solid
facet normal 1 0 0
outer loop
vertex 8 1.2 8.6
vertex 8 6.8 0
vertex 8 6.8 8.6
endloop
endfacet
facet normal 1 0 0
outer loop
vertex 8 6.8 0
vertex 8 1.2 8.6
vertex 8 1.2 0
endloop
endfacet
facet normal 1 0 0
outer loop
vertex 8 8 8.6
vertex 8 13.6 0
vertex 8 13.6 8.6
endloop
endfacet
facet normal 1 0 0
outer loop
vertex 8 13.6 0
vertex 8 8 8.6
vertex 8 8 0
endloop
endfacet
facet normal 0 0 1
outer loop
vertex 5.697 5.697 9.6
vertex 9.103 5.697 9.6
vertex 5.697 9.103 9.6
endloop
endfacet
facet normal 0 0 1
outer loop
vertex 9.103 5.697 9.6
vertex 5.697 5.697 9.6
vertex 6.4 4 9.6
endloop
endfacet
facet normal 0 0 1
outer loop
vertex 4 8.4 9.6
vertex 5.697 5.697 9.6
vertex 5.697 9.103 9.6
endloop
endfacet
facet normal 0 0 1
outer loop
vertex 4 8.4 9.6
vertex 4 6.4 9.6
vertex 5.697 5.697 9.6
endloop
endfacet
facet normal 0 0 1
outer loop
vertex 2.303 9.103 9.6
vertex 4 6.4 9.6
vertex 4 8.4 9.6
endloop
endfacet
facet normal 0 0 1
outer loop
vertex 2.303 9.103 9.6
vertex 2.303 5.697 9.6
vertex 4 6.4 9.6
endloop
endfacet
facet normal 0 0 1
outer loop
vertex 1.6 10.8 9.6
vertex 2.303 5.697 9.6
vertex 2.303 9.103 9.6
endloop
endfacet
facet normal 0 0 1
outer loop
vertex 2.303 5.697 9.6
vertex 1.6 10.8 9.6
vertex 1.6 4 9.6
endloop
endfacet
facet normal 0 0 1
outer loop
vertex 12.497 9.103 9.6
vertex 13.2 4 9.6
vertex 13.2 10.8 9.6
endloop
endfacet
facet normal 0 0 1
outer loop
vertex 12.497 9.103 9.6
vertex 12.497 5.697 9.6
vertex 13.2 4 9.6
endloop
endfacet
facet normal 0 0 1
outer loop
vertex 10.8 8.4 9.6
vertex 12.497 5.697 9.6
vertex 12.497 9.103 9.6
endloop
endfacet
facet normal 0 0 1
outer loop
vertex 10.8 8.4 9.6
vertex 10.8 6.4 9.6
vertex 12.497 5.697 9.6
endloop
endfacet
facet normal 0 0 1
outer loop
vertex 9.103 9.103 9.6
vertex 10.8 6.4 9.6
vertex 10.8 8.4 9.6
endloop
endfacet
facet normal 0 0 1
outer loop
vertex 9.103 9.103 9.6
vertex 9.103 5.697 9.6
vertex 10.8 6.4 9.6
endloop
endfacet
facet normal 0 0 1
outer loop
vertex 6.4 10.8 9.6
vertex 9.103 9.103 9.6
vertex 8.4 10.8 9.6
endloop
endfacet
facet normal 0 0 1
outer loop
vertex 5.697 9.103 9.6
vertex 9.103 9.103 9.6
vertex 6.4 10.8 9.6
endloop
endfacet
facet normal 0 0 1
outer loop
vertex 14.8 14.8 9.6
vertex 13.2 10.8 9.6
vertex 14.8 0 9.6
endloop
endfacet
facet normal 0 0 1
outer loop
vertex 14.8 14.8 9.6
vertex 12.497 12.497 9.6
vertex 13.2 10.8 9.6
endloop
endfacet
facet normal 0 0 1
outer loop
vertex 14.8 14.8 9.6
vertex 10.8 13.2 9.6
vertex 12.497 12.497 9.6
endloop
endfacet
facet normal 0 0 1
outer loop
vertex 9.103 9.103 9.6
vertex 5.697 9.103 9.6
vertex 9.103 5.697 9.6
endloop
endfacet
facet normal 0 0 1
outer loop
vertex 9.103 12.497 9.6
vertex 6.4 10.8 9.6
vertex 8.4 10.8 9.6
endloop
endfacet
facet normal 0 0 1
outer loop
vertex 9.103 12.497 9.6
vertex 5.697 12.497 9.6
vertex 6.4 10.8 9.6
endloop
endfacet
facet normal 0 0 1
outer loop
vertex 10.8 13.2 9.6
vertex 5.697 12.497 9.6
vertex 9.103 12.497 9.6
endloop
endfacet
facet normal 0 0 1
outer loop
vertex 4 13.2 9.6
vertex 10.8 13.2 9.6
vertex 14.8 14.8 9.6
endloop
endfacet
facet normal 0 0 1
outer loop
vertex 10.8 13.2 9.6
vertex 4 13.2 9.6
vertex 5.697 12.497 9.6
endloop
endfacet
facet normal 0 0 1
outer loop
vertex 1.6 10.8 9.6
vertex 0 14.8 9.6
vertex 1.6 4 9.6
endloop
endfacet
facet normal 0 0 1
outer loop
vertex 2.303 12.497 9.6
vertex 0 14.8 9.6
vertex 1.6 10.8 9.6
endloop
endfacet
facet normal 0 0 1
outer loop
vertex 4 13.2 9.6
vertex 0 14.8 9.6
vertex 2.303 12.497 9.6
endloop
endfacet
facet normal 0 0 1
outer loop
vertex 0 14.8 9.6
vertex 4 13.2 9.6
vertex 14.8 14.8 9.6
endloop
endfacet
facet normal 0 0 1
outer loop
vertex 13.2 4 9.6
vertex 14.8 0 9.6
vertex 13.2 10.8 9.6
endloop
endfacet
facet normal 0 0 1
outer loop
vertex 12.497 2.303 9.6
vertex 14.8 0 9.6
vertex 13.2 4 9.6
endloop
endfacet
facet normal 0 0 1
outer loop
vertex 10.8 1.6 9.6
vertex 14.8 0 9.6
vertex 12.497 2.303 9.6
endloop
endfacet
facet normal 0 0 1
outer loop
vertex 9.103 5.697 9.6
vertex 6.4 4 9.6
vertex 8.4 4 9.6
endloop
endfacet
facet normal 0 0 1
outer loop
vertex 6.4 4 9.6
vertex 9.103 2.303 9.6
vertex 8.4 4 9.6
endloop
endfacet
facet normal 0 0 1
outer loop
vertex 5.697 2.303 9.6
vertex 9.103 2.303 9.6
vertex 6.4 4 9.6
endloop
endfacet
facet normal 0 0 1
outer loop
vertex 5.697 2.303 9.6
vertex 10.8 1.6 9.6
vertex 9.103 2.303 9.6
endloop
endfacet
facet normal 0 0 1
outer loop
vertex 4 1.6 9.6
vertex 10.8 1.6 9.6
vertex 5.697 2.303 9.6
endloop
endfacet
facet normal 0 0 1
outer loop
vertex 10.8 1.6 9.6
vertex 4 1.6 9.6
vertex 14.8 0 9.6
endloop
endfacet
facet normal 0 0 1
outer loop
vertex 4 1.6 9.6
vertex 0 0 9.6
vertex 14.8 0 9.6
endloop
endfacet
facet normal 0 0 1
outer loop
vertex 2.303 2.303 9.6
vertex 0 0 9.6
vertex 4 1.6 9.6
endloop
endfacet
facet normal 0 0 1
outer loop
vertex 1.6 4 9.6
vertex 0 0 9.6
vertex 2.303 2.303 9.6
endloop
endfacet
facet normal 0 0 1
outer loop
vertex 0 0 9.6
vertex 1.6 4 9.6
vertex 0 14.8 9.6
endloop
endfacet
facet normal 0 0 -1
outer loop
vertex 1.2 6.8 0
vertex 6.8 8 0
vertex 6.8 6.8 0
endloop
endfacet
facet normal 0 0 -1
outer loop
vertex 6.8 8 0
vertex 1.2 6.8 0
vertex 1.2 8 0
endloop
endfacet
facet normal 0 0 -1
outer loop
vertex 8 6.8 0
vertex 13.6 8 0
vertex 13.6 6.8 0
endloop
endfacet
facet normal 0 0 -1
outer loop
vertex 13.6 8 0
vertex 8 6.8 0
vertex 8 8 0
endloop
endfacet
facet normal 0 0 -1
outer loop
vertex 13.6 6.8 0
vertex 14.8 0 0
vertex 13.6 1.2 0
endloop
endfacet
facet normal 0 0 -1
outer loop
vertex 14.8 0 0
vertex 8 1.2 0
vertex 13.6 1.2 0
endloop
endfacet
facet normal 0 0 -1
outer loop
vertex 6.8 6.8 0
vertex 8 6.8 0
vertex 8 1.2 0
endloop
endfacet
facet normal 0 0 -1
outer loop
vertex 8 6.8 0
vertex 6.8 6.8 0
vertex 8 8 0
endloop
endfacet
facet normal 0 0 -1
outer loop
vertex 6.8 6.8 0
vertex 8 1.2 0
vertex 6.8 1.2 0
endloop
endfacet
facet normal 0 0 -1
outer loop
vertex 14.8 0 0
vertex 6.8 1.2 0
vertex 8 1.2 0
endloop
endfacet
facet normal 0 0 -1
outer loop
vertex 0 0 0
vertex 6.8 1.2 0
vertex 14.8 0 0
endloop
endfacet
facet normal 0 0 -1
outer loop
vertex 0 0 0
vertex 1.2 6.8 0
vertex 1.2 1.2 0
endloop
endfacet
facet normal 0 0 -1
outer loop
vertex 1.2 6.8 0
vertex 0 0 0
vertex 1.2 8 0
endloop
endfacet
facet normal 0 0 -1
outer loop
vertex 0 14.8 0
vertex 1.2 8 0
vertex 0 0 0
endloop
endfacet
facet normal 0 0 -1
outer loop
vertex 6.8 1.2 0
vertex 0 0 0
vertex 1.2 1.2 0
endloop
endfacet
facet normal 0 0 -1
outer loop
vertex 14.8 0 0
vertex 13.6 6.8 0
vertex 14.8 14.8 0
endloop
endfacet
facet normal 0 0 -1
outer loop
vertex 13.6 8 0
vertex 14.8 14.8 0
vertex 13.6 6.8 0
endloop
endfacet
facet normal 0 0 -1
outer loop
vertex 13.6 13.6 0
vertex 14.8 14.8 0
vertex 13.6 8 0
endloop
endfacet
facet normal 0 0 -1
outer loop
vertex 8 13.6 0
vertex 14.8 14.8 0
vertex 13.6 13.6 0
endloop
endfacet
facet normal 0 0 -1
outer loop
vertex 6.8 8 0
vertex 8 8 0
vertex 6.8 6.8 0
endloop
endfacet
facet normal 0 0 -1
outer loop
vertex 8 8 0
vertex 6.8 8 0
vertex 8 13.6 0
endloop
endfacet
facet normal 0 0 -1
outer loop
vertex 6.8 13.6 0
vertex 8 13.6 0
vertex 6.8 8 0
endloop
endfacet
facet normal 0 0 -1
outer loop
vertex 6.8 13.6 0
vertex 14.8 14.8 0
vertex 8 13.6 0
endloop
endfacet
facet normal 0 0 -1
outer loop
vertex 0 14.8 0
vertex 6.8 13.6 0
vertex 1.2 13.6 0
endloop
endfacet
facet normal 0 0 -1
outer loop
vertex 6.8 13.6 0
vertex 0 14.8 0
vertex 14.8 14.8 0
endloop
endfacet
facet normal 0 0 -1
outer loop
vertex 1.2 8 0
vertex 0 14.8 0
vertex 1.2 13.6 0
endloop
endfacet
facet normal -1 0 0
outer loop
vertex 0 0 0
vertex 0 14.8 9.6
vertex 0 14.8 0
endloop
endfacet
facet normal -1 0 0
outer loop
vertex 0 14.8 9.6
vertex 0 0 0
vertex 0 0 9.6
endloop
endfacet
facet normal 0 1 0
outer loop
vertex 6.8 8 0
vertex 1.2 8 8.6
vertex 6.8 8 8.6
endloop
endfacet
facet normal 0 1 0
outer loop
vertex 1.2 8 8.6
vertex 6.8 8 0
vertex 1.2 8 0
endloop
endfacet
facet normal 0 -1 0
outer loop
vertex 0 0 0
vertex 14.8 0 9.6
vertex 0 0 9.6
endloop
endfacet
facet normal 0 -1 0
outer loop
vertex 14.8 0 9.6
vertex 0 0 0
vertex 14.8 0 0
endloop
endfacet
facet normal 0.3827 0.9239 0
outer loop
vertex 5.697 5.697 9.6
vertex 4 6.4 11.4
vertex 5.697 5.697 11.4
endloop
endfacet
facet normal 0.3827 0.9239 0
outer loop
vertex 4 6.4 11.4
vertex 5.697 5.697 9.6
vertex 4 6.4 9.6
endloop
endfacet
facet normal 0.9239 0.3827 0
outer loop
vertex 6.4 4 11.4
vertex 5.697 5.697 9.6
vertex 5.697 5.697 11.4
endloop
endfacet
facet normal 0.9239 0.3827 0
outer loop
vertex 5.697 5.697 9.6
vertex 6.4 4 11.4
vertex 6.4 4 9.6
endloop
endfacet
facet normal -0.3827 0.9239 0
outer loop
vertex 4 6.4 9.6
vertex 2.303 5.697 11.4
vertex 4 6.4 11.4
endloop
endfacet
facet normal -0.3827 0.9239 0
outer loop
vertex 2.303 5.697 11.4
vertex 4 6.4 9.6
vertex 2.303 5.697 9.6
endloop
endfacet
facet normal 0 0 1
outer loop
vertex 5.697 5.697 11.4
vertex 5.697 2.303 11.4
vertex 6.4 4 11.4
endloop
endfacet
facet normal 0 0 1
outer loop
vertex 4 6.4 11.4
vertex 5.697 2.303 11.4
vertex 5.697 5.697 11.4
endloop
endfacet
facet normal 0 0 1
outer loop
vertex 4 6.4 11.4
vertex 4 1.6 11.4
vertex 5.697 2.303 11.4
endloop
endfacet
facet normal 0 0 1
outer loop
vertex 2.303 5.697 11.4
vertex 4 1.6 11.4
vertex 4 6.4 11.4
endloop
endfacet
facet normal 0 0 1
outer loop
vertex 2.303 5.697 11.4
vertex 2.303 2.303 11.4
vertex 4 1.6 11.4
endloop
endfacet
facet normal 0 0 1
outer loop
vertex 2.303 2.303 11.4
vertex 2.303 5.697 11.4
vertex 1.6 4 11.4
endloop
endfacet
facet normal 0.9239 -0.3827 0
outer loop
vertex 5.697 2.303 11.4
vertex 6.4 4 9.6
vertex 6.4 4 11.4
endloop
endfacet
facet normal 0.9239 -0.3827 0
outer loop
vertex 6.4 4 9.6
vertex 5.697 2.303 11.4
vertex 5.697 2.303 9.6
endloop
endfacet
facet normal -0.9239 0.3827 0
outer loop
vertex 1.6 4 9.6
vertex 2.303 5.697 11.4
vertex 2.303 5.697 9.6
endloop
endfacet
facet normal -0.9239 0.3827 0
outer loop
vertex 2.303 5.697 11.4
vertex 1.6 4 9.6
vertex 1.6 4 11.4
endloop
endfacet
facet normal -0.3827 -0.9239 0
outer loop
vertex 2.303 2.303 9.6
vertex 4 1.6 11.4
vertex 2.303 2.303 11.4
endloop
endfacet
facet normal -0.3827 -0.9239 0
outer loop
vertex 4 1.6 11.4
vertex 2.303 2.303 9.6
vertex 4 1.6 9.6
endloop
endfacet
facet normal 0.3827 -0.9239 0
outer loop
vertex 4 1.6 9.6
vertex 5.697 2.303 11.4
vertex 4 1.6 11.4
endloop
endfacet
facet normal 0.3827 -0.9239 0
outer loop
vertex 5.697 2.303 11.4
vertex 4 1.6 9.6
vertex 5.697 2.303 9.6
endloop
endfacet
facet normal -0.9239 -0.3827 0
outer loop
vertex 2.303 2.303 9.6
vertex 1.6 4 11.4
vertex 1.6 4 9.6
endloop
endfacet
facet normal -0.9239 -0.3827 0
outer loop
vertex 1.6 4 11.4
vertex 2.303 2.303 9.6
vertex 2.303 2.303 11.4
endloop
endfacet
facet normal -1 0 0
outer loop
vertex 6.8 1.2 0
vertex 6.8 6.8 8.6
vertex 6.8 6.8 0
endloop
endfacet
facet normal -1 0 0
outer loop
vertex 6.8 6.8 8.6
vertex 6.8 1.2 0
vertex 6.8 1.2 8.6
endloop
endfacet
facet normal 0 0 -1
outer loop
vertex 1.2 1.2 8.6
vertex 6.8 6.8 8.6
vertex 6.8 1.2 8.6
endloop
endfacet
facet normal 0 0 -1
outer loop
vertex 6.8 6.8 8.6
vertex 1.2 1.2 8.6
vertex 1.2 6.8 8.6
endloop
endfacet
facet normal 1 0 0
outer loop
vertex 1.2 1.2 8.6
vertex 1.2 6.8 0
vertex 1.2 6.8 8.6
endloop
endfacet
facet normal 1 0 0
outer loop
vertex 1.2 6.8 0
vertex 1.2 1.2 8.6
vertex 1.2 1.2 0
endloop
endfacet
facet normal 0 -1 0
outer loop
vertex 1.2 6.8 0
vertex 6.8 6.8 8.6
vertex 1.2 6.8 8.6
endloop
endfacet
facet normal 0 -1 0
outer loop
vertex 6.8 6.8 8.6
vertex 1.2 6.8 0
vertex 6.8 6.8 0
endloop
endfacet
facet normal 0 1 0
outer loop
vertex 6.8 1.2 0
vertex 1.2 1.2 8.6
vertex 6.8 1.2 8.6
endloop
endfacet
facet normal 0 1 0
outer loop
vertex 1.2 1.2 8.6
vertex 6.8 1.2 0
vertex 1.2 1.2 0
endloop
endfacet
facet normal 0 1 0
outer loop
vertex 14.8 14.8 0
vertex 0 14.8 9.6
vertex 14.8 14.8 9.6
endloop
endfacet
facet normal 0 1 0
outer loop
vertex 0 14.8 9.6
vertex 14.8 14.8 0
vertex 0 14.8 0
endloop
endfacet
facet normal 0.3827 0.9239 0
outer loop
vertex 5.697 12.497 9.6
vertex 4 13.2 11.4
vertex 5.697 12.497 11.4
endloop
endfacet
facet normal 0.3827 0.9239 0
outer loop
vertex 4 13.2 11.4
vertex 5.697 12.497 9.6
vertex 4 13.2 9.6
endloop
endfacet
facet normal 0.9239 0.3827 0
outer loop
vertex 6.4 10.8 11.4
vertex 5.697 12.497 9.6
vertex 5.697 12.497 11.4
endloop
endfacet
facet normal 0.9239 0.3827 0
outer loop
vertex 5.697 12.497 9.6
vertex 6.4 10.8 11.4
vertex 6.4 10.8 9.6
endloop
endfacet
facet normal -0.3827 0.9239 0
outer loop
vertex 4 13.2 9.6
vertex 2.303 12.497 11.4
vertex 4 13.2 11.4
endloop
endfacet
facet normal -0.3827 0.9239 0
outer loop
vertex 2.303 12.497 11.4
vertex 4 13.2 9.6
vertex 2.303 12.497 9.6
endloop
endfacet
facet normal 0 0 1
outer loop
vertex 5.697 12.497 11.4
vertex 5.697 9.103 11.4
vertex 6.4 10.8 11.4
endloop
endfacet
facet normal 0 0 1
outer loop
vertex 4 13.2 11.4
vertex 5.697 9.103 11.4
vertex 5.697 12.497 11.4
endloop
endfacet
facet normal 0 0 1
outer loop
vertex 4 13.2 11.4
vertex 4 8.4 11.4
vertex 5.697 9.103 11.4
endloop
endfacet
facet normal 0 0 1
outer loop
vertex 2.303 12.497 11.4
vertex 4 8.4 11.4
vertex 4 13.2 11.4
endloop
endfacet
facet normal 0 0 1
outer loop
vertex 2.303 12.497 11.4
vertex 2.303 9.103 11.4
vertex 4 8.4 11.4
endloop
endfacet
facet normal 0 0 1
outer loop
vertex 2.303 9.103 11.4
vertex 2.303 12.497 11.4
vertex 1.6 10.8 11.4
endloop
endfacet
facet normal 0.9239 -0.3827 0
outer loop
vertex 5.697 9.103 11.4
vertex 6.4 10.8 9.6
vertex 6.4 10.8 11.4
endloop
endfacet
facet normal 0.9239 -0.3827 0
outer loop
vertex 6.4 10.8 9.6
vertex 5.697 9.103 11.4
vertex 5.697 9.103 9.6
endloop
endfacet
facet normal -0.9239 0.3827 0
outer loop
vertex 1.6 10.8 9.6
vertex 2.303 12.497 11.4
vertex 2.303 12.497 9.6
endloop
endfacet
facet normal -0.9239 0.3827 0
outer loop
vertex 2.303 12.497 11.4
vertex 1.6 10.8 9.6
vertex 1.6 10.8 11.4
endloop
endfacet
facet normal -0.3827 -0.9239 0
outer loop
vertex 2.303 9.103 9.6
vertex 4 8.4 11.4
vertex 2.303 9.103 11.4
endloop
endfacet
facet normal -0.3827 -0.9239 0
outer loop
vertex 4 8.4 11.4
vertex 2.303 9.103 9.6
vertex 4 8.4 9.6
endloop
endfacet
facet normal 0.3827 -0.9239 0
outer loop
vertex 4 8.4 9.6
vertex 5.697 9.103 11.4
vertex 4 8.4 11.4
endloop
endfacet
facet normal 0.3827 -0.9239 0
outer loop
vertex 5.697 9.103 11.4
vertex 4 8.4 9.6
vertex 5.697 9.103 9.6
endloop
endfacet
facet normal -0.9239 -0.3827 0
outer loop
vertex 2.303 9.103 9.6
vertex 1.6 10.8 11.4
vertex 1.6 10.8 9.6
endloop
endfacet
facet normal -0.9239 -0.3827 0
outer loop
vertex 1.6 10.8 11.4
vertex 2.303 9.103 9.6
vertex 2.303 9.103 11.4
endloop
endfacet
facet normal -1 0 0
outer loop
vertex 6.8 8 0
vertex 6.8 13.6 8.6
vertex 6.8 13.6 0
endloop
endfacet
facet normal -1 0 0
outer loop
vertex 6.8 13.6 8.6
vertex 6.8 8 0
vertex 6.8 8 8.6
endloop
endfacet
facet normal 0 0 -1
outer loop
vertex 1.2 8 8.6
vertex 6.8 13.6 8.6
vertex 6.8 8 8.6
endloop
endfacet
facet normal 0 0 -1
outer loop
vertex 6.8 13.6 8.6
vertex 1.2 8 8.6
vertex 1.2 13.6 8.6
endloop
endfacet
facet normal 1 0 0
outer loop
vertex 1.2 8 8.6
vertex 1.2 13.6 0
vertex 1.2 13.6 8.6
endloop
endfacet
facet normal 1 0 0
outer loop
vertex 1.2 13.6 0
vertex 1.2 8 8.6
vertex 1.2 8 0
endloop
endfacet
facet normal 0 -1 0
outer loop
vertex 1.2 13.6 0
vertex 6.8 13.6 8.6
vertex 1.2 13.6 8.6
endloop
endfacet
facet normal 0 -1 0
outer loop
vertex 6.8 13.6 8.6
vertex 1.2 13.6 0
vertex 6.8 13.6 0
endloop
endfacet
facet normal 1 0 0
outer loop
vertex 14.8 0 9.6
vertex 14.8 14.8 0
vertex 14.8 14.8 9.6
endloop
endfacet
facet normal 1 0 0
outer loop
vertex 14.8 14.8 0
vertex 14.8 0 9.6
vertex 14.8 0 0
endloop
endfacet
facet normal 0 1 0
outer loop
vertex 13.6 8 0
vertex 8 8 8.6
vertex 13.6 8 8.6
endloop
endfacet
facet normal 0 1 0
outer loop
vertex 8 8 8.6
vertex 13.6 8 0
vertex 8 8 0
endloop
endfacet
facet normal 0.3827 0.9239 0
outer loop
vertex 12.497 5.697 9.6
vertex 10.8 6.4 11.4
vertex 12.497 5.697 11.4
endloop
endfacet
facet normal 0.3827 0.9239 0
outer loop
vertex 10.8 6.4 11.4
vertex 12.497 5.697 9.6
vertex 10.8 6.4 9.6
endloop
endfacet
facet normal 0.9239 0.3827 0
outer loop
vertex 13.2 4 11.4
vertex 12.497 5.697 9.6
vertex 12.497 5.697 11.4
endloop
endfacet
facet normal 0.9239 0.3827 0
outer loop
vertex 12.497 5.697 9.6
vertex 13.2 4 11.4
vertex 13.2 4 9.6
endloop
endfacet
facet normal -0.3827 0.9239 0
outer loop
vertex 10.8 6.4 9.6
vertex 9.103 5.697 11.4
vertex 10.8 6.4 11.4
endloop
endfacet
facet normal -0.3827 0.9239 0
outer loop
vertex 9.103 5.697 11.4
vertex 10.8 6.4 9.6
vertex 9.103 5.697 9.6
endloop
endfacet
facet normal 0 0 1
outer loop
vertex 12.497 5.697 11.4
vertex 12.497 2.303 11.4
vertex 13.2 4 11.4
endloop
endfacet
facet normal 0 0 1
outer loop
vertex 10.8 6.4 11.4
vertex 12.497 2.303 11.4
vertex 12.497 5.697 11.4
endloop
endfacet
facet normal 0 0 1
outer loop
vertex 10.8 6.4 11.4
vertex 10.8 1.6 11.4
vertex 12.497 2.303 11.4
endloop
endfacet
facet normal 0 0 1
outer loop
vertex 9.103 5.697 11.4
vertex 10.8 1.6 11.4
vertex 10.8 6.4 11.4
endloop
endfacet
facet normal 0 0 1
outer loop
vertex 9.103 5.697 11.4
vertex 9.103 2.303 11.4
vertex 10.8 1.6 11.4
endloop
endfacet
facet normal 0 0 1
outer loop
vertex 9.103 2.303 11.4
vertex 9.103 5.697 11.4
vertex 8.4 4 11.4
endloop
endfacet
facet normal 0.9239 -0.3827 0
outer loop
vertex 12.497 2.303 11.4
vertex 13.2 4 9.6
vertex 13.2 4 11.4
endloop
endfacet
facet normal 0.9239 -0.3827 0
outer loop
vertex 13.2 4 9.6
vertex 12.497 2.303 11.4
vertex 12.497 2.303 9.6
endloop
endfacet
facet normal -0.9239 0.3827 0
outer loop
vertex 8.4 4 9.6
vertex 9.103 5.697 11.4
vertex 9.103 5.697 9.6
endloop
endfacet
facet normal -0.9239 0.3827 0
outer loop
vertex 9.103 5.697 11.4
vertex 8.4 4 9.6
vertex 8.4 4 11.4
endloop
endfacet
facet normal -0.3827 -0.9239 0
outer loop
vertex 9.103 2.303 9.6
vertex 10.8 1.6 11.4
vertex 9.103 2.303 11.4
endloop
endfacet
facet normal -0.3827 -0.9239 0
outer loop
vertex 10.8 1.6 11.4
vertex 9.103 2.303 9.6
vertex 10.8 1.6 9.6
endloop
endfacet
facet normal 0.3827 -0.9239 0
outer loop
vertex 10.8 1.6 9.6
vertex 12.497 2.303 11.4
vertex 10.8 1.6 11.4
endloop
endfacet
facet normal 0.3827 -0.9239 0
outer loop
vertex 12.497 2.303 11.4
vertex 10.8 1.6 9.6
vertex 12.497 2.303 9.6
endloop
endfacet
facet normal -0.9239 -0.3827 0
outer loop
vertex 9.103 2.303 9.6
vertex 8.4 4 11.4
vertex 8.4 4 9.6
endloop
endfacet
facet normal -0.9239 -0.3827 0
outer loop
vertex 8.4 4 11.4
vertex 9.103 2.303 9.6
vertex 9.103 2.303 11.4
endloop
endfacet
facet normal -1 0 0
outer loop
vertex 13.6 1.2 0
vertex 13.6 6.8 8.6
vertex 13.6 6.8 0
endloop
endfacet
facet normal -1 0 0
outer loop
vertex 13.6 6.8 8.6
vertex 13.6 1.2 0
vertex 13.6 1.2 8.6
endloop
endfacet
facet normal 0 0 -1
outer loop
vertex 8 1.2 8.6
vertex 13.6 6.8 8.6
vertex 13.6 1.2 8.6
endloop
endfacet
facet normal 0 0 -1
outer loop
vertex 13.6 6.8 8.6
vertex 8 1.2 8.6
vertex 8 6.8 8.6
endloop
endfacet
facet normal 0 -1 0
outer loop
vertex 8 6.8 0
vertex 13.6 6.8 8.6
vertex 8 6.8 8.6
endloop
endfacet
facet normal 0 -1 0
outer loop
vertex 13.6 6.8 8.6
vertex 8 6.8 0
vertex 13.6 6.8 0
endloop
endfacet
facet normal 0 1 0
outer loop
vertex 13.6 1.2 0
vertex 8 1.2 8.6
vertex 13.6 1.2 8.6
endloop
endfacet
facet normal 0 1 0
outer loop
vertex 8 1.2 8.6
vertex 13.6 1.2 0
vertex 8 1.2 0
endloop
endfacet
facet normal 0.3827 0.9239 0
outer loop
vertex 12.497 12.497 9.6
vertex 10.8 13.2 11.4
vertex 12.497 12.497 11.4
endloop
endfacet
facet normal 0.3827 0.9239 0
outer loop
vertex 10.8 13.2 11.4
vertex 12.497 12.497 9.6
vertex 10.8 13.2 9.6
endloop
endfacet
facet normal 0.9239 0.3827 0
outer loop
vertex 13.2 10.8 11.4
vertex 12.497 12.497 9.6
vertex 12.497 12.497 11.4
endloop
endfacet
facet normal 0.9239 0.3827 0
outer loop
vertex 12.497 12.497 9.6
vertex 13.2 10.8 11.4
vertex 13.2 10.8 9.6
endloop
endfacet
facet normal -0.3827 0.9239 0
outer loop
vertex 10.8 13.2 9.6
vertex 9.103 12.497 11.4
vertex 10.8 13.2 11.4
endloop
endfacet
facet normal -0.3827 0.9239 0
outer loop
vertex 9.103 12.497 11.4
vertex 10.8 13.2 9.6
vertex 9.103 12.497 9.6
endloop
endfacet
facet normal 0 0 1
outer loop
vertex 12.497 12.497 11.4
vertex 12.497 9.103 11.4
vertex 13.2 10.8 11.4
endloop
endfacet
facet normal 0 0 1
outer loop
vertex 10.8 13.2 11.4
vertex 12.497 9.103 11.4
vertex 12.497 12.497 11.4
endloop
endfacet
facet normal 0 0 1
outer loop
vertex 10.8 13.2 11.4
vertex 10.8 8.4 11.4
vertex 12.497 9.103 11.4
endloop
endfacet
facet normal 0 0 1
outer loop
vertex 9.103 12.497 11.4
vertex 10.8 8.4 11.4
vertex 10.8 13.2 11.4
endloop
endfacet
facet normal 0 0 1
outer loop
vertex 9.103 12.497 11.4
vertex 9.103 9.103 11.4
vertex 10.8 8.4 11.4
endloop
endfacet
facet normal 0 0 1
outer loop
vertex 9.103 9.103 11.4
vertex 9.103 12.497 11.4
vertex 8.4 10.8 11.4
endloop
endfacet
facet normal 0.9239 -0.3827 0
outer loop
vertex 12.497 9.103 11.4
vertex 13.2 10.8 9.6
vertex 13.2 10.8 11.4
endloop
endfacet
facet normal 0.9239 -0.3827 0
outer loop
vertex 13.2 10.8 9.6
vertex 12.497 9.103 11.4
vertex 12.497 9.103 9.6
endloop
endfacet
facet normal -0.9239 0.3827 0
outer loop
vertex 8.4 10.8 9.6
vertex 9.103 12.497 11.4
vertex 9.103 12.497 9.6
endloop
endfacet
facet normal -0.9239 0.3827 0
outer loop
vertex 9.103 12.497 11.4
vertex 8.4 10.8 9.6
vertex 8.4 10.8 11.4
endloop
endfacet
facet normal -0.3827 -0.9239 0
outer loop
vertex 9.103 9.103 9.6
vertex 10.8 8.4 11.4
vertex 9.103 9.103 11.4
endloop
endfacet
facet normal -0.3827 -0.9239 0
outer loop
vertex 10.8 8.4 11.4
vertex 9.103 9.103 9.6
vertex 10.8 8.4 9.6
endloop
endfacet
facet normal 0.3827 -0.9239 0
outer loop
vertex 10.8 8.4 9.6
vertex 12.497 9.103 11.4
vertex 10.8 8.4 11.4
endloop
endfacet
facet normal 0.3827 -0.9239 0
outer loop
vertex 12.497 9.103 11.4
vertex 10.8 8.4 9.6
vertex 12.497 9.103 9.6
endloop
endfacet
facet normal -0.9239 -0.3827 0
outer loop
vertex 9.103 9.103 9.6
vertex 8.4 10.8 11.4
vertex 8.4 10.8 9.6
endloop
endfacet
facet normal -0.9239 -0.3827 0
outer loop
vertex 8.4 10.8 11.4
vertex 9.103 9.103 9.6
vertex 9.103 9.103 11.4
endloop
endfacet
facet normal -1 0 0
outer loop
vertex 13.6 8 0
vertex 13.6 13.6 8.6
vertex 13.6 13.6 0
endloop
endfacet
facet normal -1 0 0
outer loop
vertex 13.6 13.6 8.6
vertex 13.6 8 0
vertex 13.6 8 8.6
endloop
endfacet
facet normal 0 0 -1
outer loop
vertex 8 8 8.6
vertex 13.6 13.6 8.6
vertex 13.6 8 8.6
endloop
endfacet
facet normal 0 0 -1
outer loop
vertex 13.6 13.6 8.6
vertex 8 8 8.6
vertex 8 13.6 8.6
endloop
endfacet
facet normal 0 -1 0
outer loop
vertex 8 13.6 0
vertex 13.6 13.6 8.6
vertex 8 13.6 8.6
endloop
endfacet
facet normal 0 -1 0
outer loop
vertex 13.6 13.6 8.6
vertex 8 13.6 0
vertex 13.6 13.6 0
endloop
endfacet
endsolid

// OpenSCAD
length = 2; // [1:32]

width = 2; // [1:32]

//In multiples of tile heights; one standard brick is 3 tiles high
height = 3; // [1:96]

flat = 0; // [0:No, 1.9:Yes]

/* [Hidden] */
l = 8.0;
w = 8.0;
h = height*3.2;

module brick(){				//brick() module
	difference() {
		union() {
		cube([l,w,h]);			//inner invisible cube
			{
				translate([4,4,1.8])
				cylinder(r=2.4,h=h-flat);
			}
		}
		translate([1.2,1.2,-0.1]) cube([l-2.4,w-2.4,h-0.9]);
	}
}


for (i = [0 : width-1])		//lay down a cube for each value of width
{
	for (x = [0 : length-1])	//lay down a cube for each value of length
	{
		translate([i*6.8,x*6.8,0])  //move along space of one brick - wall
		brick();				//place 1x1 brick() module
	}
}
